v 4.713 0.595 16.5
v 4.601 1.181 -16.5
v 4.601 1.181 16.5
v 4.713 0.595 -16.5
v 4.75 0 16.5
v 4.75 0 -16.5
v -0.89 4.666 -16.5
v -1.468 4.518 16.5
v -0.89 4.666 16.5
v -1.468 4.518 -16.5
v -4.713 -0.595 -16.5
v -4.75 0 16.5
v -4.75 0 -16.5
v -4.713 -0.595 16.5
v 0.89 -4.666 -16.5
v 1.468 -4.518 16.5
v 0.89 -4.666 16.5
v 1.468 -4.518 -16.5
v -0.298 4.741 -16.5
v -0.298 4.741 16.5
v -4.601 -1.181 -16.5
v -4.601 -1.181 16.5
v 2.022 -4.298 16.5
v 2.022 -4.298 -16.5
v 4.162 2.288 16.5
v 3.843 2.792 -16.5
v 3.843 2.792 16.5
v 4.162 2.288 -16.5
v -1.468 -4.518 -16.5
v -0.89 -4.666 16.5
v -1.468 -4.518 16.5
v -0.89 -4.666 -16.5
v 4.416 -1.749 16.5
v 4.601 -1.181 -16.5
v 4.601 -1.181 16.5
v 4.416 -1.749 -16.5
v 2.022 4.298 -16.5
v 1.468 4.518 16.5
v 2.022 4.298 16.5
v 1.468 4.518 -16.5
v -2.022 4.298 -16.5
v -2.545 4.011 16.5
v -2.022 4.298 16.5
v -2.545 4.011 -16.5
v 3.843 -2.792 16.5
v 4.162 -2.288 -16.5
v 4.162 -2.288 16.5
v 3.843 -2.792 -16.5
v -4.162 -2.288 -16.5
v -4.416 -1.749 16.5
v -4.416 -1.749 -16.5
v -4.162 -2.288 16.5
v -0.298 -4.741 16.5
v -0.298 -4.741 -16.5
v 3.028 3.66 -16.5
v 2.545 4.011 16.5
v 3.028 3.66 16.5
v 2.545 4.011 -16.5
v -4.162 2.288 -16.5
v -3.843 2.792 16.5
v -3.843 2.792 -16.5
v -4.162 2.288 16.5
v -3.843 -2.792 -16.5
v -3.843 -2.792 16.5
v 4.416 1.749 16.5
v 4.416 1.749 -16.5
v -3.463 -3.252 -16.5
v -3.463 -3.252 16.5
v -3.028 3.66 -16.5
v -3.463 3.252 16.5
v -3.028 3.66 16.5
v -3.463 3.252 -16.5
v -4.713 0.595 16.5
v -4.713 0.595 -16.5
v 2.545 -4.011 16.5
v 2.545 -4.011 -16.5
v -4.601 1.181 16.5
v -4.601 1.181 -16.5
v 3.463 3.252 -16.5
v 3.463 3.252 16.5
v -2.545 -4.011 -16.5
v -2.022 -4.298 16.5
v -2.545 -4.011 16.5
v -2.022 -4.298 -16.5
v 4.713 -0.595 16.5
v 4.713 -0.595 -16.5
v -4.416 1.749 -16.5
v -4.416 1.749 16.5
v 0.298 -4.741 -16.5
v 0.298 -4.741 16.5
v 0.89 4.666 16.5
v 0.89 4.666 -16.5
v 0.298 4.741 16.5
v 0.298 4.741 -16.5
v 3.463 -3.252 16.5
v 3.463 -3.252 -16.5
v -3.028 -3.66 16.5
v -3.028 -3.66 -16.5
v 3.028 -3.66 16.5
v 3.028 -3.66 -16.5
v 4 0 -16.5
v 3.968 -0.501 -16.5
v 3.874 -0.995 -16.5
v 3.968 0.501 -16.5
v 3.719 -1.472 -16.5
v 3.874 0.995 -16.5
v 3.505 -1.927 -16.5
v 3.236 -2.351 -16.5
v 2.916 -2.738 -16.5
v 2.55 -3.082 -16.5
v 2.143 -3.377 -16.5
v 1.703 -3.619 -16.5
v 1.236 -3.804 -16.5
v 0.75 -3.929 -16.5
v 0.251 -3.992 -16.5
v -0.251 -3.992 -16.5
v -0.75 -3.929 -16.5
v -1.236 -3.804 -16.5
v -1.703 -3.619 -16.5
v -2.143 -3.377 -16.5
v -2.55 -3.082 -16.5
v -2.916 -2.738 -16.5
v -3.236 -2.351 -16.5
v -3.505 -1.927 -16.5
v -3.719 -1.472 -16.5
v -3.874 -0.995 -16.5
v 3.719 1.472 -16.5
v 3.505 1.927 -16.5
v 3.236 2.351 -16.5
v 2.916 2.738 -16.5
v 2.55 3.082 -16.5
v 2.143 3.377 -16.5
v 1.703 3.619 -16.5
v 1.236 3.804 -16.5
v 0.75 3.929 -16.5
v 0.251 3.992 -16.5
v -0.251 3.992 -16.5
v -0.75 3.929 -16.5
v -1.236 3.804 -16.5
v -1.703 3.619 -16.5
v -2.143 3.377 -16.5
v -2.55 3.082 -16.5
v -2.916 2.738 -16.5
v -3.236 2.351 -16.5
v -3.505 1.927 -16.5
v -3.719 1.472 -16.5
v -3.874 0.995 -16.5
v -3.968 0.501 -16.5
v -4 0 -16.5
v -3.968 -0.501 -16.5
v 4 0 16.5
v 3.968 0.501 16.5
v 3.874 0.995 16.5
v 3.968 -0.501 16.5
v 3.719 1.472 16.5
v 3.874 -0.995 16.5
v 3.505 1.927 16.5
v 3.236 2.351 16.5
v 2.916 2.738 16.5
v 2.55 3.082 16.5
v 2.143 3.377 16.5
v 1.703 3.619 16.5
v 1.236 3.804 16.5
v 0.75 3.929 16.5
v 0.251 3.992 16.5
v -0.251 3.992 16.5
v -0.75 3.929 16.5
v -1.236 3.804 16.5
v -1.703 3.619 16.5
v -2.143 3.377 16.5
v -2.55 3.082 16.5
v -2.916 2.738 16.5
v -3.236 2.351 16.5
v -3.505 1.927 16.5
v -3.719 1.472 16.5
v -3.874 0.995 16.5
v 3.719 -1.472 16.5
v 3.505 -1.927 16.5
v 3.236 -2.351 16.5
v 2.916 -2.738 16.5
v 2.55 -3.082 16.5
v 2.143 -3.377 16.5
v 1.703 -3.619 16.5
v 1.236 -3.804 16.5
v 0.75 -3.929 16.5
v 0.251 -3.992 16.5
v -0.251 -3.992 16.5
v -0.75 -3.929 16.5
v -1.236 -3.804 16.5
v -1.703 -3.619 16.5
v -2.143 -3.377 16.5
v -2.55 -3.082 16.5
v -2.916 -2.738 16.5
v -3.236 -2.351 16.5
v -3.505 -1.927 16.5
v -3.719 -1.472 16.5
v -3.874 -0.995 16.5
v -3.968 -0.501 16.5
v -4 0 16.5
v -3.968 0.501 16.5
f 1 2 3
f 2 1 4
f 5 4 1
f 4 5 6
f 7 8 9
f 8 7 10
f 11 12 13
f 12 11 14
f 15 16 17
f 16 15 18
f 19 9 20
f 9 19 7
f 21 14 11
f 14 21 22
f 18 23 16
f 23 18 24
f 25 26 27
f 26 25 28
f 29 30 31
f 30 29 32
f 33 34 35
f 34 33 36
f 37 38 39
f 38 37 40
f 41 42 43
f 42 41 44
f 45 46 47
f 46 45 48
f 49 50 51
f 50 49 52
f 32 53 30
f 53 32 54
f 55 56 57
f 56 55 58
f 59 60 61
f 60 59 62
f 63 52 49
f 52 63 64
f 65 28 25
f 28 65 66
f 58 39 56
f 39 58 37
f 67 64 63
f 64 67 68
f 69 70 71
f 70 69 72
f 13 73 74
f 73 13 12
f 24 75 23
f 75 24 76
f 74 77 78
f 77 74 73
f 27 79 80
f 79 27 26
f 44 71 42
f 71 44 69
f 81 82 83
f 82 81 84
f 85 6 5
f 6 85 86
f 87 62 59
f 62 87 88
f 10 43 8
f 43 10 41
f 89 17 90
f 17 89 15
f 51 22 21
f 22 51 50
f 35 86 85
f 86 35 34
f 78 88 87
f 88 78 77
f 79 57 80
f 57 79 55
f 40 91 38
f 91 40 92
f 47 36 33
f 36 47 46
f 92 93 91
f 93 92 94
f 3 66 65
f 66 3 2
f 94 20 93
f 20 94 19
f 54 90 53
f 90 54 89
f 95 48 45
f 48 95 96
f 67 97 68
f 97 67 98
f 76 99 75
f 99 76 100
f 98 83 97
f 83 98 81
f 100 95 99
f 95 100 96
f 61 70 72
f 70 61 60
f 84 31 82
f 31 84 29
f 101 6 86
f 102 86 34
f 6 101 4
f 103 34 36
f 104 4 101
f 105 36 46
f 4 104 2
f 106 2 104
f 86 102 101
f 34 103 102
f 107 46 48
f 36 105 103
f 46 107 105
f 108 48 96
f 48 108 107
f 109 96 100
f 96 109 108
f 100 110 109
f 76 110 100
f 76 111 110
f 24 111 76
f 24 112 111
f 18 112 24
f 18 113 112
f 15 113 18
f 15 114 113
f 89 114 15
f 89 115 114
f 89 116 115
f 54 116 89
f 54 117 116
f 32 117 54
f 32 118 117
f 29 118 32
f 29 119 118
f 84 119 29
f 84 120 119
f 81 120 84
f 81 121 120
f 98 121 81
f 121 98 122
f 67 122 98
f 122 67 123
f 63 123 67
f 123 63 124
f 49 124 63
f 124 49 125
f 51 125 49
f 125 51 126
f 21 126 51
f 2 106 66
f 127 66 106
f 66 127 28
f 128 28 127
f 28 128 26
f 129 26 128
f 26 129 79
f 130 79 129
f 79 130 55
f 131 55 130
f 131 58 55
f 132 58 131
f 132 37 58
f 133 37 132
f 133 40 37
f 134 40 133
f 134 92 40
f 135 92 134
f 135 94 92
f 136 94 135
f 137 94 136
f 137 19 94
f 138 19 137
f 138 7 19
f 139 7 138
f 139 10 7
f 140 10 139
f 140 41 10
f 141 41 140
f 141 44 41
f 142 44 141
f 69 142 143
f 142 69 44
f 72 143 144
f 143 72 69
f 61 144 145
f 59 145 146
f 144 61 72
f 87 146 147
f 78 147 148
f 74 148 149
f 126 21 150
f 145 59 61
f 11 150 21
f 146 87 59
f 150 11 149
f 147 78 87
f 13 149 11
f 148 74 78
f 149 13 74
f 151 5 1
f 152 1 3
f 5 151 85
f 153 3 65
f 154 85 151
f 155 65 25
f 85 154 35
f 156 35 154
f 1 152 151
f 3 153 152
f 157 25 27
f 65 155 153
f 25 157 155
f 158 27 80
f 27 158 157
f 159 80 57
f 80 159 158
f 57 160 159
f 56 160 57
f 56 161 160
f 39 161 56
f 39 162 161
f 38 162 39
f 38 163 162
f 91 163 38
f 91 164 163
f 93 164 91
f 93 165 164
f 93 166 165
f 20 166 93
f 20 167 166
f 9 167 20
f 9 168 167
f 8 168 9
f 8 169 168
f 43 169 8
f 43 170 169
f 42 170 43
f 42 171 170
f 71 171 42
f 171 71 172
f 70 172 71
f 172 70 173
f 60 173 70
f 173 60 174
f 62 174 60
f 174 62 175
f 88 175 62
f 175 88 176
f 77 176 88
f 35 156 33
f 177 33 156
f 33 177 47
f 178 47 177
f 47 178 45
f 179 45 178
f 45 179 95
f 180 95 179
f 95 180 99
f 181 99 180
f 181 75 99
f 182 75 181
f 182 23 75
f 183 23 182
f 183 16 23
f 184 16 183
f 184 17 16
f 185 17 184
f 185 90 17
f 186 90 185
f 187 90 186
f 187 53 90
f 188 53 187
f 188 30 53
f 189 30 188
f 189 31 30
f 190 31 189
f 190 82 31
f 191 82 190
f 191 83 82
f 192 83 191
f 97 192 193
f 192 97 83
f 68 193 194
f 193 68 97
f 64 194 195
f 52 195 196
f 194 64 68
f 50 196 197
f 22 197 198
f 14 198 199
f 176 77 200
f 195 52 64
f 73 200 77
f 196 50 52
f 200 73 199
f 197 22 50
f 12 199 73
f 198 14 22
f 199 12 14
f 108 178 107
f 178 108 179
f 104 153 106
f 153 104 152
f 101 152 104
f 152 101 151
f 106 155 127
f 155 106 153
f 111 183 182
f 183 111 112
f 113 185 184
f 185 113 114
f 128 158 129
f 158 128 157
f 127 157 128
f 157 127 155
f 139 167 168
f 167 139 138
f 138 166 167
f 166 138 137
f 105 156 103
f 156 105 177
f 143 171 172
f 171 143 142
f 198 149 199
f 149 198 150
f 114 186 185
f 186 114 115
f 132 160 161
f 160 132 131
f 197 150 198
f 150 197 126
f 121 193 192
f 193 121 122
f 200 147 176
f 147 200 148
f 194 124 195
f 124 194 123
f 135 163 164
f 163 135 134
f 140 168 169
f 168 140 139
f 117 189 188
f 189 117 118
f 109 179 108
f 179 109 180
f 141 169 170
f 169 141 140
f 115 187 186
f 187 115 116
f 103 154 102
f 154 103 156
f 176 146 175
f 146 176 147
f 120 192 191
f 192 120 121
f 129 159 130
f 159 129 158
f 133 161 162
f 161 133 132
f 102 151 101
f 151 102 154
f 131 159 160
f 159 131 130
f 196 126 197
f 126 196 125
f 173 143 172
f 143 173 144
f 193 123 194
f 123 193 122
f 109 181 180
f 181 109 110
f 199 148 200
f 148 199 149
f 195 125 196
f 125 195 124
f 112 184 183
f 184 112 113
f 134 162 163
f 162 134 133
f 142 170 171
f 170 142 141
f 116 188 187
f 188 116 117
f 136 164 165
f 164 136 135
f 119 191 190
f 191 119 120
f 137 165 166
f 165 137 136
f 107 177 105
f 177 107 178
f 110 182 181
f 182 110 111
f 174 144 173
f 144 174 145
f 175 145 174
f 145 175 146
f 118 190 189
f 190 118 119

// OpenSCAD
$fn = 50;


difference() {
	union() {
		translate(v = [0, 0, -16.5000000000]) {
			cylinder(h = 33, r = 4.7500000000);
		}
	}
	union() {
		translate(v = [0, 0, -100.0000000000]) {
			cylinder(h = 200, r = 4.0000000000);
		}
	}
}
